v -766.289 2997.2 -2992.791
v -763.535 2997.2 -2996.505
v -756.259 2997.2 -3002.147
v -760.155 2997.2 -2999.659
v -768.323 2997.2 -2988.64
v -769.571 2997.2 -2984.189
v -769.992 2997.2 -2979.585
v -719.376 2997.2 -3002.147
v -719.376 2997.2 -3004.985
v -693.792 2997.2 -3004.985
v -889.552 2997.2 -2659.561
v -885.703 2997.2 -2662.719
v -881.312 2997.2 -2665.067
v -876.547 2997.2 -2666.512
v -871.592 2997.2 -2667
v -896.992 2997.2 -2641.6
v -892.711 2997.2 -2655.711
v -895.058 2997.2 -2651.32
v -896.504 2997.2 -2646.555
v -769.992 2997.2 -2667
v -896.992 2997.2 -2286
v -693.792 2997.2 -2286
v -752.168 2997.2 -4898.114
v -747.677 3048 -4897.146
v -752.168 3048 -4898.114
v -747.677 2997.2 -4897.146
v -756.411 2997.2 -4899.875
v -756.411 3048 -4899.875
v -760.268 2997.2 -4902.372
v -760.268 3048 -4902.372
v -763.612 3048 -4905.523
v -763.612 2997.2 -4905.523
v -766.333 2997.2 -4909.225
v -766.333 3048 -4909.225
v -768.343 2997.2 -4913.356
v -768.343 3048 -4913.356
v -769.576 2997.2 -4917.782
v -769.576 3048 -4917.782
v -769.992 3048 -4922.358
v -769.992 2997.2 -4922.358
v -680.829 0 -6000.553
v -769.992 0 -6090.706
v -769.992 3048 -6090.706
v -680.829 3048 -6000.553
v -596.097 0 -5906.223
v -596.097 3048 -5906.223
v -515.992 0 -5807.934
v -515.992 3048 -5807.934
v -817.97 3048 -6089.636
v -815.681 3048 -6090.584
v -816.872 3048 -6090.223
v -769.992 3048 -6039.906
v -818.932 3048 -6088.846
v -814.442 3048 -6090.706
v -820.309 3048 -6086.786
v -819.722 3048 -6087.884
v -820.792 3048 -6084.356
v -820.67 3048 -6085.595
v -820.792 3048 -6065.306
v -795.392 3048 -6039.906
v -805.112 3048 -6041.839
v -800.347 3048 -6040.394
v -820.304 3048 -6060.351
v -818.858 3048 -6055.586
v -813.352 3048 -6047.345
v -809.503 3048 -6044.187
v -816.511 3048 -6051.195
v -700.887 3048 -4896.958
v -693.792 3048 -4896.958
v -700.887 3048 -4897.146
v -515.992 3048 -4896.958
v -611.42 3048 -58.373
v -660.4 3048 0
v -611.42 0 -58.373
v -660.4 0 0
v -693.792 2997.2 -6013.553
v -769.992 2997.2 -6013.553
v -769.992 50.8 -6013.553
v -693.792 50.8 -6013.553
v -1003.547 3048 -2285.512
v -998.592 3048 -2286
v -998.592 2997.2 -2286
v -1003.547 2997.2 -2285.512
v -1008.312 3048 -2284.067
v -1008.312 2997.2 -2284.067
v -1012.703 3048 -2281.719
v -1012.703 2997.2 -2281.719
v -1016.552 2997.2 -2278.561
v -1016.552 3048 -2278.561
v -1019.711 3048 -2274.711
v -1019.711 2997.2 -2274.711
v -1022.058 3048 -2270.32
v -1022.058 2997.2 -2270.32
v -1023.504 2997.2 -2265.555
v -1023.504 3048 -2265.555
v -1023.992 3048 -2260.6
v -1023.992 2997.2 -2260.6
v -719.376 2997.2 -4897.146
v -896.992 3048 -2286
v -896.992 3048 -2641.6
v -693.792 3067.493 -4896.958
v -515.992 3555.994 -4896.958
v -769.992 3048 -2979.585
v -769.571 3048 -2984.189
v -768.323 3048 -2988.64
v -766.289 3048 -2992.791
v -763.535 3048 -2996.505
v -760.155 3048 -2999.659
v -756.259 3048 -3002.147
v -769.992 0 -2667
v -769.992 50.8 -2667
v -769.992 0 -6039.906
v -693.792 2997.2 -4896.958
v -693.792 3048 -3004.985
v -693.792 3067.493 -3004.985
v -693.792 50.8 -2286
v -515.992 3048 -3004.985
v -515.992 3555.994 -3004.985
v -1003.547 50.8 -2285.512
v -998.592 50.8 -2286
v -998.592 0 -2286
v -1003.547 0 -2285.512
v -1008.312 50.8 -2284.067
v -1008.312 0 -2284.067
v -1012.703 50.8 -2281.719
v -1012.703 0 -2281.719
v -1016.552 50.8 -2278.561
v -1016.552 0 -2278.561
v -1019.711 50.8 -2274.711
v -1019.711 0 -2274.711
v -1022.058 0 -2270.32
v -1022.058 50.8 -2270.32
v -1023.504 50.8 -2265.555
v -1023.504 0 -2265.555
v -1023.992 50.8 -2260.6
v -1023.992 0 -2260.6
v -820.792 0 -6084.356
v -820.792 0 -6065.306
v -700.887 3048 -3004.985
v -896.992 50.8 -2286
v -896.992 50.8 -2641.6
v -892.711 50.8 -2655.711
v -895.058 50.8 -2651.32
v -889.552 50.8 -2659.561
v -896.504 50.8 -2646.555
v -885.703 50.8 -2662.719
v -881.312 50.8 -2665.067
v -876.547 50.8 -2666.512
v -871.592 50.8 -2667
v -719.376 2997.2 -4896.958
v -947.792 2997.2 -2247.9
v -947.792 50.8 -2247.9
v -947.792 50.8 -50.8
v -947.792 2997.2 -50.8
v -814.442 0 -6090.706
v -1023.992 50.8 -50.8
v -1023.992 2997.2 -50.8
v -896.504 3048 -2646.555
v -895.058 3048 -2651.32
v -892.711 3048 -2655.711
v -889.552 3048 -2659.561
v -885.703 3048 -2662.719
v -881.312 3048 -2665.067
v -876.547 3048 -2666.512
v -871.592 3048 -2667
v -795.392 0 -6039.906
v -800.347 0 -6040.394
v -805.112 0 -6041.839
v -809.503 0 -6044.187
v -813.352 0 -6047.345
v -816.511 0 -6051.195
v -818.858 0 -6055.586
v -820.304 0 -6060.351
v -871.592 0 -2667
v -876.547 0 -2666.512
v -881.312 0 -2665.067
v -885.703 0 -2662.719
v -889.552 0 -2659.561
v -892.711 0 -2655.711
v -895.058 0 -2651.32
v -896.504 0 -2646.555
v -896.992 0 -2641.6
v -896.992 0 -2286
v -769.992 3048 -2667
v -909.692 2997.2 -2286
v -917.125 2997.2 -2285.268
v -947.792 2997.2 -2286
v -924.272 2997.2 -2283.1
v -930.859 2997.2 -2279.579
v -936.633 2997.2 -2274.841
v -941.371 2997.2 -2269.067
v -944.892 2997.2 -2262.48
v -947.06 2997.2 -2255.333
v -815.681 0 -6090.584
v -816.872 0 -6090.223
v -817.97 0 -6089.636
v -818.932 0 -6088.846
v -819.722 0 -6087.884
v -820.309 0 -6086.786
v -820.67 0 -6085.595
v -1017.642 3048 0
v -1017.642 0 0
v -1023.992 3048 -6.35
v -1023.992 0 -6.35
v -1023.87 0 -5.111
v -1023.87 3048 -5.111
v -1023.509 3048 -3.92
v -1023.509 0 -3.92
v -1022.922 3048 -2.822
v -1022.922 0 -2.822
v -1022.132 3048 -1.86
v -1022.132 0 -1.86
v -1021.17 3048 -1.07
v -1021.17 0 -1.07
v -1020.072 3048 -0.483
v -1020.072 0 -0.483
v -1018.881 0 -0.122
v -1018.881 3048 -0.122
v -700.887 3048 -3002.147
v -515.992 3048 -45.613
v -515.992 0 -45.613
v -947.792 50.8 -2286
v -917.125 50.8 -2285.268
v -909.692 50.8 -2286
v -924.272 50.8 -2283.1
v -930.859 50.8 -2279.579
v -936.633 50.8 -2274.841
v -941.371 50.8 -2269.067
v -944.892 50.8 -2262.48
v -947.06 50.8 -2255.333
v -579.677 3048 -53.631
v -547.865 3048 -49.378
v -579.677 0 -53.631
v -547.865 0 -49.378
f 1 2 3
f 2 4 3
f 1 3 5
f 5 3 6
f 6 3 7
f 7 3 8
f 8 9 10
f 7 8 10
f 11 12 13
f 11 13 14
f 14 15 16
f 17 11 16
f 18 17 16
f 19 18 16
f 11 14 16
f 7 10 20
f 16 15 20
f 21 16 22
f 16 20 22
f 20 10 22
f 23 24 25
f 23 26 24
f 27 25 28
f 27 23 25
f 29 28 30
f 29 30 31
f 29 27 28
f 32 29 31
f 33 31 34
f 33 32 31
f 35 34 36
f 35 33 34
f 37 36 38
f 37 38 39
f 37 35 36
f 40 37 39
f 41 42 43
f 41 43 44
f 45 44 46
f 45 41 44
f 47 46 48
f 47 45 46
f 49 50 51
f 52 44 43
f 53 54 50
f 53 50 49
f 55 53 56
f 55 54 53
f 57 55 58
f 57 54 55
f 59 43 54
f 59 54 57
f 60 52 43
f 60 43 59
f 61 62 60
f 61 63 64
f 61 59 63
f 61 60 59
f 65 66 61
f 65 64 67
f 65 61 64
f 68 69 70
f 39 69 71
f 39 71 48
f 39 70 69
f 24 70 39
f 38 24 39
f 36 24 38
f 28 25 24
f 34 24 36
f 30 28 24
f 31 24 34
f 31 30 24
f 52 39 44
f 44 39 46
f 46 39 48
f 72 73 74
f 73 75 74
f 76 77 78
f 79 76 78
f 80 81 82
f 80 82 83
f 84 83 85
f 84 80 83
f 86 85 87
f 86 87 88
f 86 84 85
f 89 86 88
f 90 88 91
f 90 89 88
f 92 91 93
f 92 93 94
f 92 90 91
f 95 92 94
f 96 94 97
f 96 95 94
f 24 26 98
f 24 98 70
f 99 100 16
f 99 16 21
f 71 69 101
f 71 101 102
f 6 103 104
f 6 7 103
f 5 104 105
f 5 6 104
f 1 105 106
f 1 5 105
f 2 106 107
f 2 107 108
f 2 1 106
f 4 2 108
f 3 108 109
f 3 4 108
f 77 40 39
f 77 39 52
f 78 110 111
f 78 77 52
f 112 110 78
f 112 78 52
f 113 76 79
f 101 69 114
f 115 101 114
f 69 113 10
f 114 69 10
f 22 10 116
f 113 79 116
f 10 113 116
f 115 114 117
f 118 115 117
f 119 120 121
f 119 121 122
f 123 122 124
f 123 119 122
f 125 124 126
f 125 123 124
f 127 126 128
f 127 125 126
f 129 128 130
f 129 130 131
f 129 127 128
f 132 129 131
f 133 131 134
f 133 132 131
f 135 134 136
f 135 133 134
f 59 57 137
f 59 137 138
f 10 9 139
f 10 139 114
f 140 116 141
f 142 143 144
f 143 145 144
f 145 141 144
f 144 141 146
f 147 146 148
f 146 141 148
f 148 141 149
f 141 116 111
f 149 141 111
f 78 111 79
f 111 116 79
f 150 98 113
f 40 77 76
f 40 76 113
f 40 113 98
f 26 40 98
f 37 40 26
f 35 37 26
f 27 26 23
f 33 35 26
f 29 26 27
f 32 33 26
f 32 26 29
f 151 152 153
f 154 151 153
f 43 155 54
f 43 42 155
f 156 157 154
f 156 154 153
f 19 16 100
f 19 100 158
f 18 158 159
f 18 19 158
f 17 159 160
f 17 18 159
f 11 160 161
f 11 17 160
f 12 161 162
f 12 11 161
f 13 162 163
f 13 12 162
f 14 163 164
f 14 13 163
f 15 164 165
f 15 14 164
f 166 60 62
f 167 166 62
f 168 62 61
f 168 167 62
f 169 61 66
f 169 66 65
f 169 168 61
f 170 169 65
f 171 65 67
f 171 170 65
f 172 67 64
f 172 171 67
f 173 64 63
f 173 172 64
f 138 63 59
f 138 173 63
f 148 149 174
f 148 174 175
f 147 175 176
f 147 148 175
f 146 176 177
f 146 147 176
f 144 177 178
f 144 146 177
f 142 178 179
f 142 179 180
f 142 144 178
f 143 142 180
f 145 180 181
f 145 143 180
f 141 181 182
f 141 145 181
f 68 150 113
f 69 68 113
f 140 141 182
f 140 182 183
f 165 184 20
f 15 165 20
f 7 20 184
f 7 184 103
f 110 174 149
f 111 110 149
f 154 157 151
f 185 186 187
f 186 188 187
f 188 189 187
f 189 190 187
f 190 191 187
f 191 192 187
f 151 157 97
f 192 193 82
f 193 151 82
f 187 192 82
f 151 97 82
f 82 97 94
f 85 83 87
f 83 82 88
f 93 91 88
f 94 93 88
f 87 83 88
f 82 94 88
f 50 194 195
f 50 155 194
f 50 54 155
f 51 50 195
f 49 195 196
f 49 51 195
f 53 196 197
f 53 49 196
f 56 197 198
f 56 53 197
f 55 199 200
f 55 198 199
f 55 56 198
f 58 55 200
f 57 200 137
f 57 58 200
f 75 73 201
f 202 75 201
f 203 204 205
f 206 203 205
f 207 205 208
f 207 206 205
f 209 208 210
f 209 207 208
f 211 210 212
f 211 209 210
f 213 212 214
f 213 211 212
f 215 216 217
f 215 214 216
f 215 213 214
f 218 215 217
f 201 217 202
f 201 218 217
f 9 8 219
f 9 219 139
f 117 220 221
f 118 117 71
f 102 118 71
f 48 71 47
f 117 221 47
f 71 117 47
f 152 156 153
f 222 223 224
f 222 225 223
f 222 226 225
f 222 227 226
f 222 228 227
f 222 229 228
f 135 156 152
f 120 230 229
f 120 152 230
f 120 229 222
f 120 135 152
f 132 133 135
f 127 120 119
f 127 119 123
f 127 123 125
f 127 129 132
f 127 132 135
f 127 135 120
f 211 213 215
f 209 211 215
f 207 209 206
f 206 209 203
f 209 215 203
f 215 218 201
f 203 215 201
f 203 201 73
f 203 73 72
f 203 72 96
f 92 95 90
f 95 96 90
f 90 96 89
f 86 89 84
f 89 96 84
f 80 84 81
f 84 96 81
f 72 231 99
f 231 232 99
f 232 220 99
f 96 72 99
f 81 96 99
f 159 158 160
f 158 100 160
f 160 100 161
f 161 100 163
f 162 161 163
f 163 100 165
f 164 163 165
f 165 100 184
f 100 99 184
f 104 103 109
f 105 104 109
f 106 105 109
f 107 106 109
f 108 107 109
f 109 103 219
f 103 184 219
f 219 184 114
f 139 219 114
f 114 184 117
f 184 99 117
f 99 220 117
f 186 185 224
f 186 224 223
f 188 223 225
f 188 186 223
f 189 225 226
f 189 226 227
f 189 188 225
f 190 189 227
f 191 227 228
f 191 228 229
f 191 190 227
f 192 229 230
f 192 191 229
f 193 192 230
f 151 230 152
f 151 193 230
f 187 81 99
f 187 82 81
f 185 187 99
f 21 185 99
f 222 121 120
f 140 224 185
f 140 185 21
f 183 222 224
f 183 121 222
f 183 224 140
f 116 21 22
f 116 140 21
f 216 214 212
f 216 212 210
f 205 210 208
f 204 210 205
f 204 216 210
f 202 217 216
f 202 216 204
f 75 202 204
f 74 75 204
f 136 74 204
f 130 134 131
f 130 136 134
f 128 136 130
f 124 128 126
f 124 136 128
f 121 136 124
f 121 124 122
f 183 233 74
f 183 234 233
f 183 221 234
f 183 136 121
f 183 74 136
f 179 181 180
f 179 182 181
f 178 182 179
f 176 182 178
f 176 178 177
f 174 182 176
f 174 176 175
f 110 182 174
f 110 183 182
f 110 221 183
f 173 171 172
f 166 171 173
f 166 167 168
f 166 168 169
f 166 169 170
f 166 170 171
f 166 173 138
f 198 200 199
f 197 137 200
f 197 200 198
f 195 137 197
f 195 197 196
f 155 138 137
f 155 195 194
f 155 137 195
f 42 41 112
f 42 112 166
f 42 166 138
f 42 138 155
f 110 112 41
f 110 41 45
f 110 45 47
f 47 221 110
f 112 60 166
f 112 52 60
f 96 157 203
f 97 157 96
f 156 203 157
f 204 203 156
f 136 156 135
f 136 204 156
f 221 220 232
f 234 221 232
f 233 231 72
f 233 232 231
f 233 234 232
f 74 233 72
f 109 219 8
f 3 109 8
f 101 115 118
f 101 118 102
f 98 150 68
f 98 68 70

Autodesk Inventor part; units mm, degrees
ref_plane "YZ Plane" through (0, 0, 0) normal (1, 0, 0) x (0, 1, 0)
ref_plane "XZ Plane" through (0, 0, 0) normal (0, 1, 0) x (-1, 0, 0)
sketch "Sketch1" plane through (0, 0, 0) normal (0, 1, 0) x (-1, 0, 0)
  line L0 (0, 0) -> (1023.9919, 0)
  line L1 (1023.9919, 0) -> (1023.9919, -167.3096)
  line L2 (0, 0) -> (508, 0)
  line L3 (1023.9919, 0) -> (660.4, 0)
  line L4 (660.4, 0) -> (611.4196, -58.3726)
  arc A0 (611.4196, -58.3726) -> (-38.1005, -58.3726) centre (286.6596, -2124.0484) ccw
  line L5 (1023.9919, 0) -> (660.4, 0)
  line L6 (769.9919, -2286) -> (769.9919, -6090.706)
  arc A1 (-38.1005, -4189.7242) -> (769.9919, -6090.706) centre (2601.9104, -4189.7242) ccw
  line L7 (-38.1005, -58.3726) -> (-38.1005, -4189.7242)
  line L8 (1023.9919, 0) -> (1023.9919, -2286)
  line L9 (1023.9919, -2286) -> (769.9919, -2286)
  dimension "d1" = 6096
  dimension "d2" = 508
  dimension "d11" = 76.2
  dimension "d12" = 130
  dimension "d49" = 2286
  dimension "d51" = 254
extrude "Extrusion1" add sketch "Sketch1" along normal blind 3048
sketch "Sketch6" plane through (-769.9919, 0, -6090.706) normal (-1, 0, 0) x (0, 0, 1)
  line L0 (0, 0) -> (0, 3048) projected
  line L1 (0, 0) -> (3804.706, 0) projected
  line L2 (0, 3048) -> (50.8, 3048)
  line L3 (50.8, 3048) -> (50.8, 0)
  line L4 (50.8, 0) -> (0, 0)
  line L5 (0, 0) -> (0, 3048)
  point P0 (6090.706, 0)
  dimension "d33" = 50.8
extrude "Extrusion6" add sketch "Sketch6" along normal blind 50.8
fillet "Fillet1" radius 25.4 1 edges at (-820.7919, 1524, -6039.906)
fillet "Fillet2" radius 6.35 1 edges at (-820.7919, 1524, -6090.706)
fillet "Fillet4" radius 25.4 1 edges at (38.1005, 1524, -58.3726)
fillet "Fillet7" radius 6.35 1 edges at (-1023.9919, 1524, 0)
sketch "Sketch11" plane through (-769.9919, 0, -2286) normal (-1, 0, 0) x (0, 0, 1)
  line L0 (0, 0) -> (0, 3048) projected
  line L1 (-3753.906, 0) -> (0, 0) projected
  line L2 (0, 3048) -> (-3753.906, 3048)
  line L3 (-3753.906, 3048) -> (-3753.906, 0)
  line L4 (-3753.906, 0) -> (0, 0)
  line L5 (0, 0) -> (0, 3048)
  line L6 (-3753.906, 0) -> (0, 0)
  line L7 (0, 0) -> (0, 3048)
  line L8 (0, 3048) -> (-3753.906, 3048)
  line L9 (-3753.906, 3048) -> (-3753.906, 0)
  line L10 (-50.8, 2997.2) -> (-3727.5531, 2997.2)
  line L11 (-3727.5531, 2997.2) -> (-3727.5531, 50.8)
  line L12 (-3727.5531, 50.8) -> (-50.8, 50.8)
  line L13 (-50.8, 50.8) -> (0, 50.8)
  line L14 (-50.8, 2997.2) -> (0, 2997.2)
  point P0 (2286, 0)
  dimension "d55" = 50.8
  dimension "d56" = 50.8
extrude "Extrusion9" cut sketch "Sketch11" against normal blind 76.2 contours L13 L12 L11 L10 L14 L0
ref_plane "Work Plane12" through (-515.9919, 0, -1905) normal (-1, 0, 0) x (0, 0, 1)
sketch "Sketch12" plane through (-515.9919, 0, -1905) normal (-1, 0, 0) x (0, 0, 1)
  line L0 (2216.3698, -160.707) -> (-4488.1257, -160.707)
  line L1 (-4488.1257, -160.707) -> (-4488.1257, 3204.096)
  line L2 (-4488.1257, 3204.096) -> (2216.3698, 3204.096)
  line L3 (2216.3698, 3204.096) -> (2216.3698, -160.707)
  point P0 (1905, 0)
extrude "Extrusion10" cut sketch "Sketch12" against normal blind 1270
ref_plane "Work Plane13" through (-515.9919, 3048, -3043.1155) normal (1, 0, 0) x (0, 0, -1)
sketch "Sketch13" plane through (0, 3048, 0) normal (0, 1, 0) x (1, 0, 0)
  line L0 (-769.9919, 6039.906) -> (-769.9919, 2286) projected
  line L1 (-769.9919, 2286) -> (-769.9919, 3004.9849)
  line L2 (-769.9919, 6039.9575) -> (-769.9919, 4896.9575)
  line L3 (-769.9919, 3004.9849) -> (-693.7919, 3004.9849)
  line L4 (-693.7919, 3004.9849) -> (-693.7919, 4896.9575)
  line L5 (-693.7919, 6013.5531) -> (-693.7919, 2286) projected
  line L6 (-769.9919, 4896.9575) -> (-693.7919, 4896.9575)
  point P0 (0, 0)
  point P1 (-693.7919, 6014.208)
  dimension "d62" = 1143
  dimension "d63" = 76.2
extrude "Extrusion11" cut sketch "Sketch13" against normal blind 1524
fillet "Fillet8" radius 25.4 1 edges at (-769.9919, 3022.6, -3004.9849)
fillet "Fillet10" radius 25.4 1 edges at (-769.9919, 3022.6, -4896.9575)
sketch "Sketch14" plane through (0, 3048, 0) normal (0, 1, 0) x (1, 0, 0)
  line L0 (-693.7919, 4896.9575) -> (-693.7919, 3004.9849) projected
  line L1 (-693.7919, 4896.9575) -> (-515.9919, 4896.9575)
  line L2 (-515.9919, 45.6133) -> (-515.9919, 5807.9335) projected
  line L3 (-693.7919, 3004.9849) -> (-515.9919, 3004.9849)
  line L4 (-515.9919, 3004.9849) -> (-515.9919, 4896.9575)
  line L5 (-515.9919, 4896.9575) -> (-693.7919, 4896.9575)
  line L6 (-693.7919, 4896.9575) -> (-693.7919, 3004.9849)
  point P0 (0, 0)
extrude "Extrusion12" add sketch "Sketch14" along normal blind 508
ref_plane "Work Plane17" through (-515.9919, 3556, -45.6133) normal (-0.9397, 0.342, 0) x (0, 0, -1)
sketch "Sketch15" plane through (-515.9919, 3556, -45.6133) normal (-0.9397, 0.342, 0) x (0, 0, -1)
  line L0 (2956.5337, 659.9401) -> (4851.5322, 659.9401)
  line L1 (4851.5322, 659.9401) -> (4851.5322, -78.2543)
  line L2 (4851.5322, -78.2543) -> (2956.5337, -78.2543)
  line L3 (2956.5337, -78.2543) -> (2956.5337, 659.9401)
  point P0 (-45.6133, 3165.0673)
extrude "Extrusion13" cut sketch "Sketch15" along normal blind 508
sketch "Sketch16" plane through (-769.9919, 2997.2, -2286) normal (-1, 0, 0) x (0, 0, 1)
  line L0 (0, 50.8) -> (-718.9849, 50.8)
  line L1 (-718.9849, 50.8) -> (-718.9849, 203.1957)
  line L2 (-693.5849, 50.8) -> (0, 50.8) projected
  line L3 (-718.9849, 0) -> (0, 0) projected
  line L4 (0, 50.8) -> (-718.9849, 50.8)
  line L5 (-718.9849, 50.8) -> (-718.9849, 0)
  line L6 (-718.9849, 0) -> (0, 0)
  line L7 (0, 0) -> (0, 50.8)
  line L8 (0, 50.8) -> (-381, 50.8)
  line L9 (-381, 50.8) -> (-381, 0)
  line L10 (-381, 0) -> (0, 0)
  line L11 (0, 0) -> (0, 50.8)
  point P0 (2286, -2997.2)
  point P1 (-381, 50.8)
  point P2 (-381, 0)
  point P3 (0, 0)
  dimension "d78" = 381
extrude "Extrusion14" add sketch "Sketch16" along normal blind 127 contours L7 L3 L9 L0
fillet "Fillet13" radius 25.4 1 edges at (-896.9919, 3022.6, -2667)
sketch "Sketch17" plane through (-769.9919, 0, -6039.906) normal (-1, 0, 0) x (0, 0, 1)
  line L0 (3753.906, 50.8) -> (26.3529, 50.8) projected
  line L1 (3753.906, 0) -> (3372.906, 0)
  line L2 (3372.906, 0) -> (3372.906, 50.8)
  line L3 (3372.906, 50.8) -> (3753.906, 50.8)
  line L4 (3753.906, 50.8) -> (3753.906, 0)
  point P0 (6039.906, 0)
  point P1 (25.698, 50.8)
  dimension "d83" = 381
extrude "Extrusion15" add sketch "Sketch17" along normal blind 127
fillet "Fillet15" radius 25.4 1 edges at (-896.9919, 25.4, -2667)
sketch "Sketch18" plane through (-1023.9919, 0, -2286) normal (-1, 0, 0) x (0, 0, 1)
  line L0 (0, 3048) -> (-355.6, 3048) projected
  line L1 (2286, 0) -> (0, 0)
  line L2 (0, 0) -> (0, 3048)
  line L3 (0, 3048) -> (2286, 3048)
  line L4 (2286, 3048) -> (2286, 0)
  line L5 (2235.2, 50.8) -> (50.8, 50.8)
  line L6 (50.8, 2997.2) -> (2235.2, 2997.2)
  line L7 (2235.2, 2997.2) -> (2235.2, 50.8)
  line L8 (50.8, 2997.2) -> (0, 2997.2)
  line L9 (0, 0) -> (0, 3048) projected
  line L10 (50.8, 50.8) -> (0, 50.8)
  point P0 (0, 2997.2)
  dimension "d88" = 50.8
extrude "Extrusion16" cut sketch "Sketch18" against normal blind 76.2 contours L2 L8 L6 L7 L5 L10
fillet "Fillet17" radius 25.4 1 edges at (-1023.9919, 3022.6, -2286)
fillet "Fillet18" radius 25.4 1 edges at (-1023.9919, 25.4, -2286)
fillet "Fillet19" radius 38.1 1 edges at (-947.7919, 1524, -2286)
properties part number "ShipDesign-ver4-1111-2021" material "Wood (Oak)"
